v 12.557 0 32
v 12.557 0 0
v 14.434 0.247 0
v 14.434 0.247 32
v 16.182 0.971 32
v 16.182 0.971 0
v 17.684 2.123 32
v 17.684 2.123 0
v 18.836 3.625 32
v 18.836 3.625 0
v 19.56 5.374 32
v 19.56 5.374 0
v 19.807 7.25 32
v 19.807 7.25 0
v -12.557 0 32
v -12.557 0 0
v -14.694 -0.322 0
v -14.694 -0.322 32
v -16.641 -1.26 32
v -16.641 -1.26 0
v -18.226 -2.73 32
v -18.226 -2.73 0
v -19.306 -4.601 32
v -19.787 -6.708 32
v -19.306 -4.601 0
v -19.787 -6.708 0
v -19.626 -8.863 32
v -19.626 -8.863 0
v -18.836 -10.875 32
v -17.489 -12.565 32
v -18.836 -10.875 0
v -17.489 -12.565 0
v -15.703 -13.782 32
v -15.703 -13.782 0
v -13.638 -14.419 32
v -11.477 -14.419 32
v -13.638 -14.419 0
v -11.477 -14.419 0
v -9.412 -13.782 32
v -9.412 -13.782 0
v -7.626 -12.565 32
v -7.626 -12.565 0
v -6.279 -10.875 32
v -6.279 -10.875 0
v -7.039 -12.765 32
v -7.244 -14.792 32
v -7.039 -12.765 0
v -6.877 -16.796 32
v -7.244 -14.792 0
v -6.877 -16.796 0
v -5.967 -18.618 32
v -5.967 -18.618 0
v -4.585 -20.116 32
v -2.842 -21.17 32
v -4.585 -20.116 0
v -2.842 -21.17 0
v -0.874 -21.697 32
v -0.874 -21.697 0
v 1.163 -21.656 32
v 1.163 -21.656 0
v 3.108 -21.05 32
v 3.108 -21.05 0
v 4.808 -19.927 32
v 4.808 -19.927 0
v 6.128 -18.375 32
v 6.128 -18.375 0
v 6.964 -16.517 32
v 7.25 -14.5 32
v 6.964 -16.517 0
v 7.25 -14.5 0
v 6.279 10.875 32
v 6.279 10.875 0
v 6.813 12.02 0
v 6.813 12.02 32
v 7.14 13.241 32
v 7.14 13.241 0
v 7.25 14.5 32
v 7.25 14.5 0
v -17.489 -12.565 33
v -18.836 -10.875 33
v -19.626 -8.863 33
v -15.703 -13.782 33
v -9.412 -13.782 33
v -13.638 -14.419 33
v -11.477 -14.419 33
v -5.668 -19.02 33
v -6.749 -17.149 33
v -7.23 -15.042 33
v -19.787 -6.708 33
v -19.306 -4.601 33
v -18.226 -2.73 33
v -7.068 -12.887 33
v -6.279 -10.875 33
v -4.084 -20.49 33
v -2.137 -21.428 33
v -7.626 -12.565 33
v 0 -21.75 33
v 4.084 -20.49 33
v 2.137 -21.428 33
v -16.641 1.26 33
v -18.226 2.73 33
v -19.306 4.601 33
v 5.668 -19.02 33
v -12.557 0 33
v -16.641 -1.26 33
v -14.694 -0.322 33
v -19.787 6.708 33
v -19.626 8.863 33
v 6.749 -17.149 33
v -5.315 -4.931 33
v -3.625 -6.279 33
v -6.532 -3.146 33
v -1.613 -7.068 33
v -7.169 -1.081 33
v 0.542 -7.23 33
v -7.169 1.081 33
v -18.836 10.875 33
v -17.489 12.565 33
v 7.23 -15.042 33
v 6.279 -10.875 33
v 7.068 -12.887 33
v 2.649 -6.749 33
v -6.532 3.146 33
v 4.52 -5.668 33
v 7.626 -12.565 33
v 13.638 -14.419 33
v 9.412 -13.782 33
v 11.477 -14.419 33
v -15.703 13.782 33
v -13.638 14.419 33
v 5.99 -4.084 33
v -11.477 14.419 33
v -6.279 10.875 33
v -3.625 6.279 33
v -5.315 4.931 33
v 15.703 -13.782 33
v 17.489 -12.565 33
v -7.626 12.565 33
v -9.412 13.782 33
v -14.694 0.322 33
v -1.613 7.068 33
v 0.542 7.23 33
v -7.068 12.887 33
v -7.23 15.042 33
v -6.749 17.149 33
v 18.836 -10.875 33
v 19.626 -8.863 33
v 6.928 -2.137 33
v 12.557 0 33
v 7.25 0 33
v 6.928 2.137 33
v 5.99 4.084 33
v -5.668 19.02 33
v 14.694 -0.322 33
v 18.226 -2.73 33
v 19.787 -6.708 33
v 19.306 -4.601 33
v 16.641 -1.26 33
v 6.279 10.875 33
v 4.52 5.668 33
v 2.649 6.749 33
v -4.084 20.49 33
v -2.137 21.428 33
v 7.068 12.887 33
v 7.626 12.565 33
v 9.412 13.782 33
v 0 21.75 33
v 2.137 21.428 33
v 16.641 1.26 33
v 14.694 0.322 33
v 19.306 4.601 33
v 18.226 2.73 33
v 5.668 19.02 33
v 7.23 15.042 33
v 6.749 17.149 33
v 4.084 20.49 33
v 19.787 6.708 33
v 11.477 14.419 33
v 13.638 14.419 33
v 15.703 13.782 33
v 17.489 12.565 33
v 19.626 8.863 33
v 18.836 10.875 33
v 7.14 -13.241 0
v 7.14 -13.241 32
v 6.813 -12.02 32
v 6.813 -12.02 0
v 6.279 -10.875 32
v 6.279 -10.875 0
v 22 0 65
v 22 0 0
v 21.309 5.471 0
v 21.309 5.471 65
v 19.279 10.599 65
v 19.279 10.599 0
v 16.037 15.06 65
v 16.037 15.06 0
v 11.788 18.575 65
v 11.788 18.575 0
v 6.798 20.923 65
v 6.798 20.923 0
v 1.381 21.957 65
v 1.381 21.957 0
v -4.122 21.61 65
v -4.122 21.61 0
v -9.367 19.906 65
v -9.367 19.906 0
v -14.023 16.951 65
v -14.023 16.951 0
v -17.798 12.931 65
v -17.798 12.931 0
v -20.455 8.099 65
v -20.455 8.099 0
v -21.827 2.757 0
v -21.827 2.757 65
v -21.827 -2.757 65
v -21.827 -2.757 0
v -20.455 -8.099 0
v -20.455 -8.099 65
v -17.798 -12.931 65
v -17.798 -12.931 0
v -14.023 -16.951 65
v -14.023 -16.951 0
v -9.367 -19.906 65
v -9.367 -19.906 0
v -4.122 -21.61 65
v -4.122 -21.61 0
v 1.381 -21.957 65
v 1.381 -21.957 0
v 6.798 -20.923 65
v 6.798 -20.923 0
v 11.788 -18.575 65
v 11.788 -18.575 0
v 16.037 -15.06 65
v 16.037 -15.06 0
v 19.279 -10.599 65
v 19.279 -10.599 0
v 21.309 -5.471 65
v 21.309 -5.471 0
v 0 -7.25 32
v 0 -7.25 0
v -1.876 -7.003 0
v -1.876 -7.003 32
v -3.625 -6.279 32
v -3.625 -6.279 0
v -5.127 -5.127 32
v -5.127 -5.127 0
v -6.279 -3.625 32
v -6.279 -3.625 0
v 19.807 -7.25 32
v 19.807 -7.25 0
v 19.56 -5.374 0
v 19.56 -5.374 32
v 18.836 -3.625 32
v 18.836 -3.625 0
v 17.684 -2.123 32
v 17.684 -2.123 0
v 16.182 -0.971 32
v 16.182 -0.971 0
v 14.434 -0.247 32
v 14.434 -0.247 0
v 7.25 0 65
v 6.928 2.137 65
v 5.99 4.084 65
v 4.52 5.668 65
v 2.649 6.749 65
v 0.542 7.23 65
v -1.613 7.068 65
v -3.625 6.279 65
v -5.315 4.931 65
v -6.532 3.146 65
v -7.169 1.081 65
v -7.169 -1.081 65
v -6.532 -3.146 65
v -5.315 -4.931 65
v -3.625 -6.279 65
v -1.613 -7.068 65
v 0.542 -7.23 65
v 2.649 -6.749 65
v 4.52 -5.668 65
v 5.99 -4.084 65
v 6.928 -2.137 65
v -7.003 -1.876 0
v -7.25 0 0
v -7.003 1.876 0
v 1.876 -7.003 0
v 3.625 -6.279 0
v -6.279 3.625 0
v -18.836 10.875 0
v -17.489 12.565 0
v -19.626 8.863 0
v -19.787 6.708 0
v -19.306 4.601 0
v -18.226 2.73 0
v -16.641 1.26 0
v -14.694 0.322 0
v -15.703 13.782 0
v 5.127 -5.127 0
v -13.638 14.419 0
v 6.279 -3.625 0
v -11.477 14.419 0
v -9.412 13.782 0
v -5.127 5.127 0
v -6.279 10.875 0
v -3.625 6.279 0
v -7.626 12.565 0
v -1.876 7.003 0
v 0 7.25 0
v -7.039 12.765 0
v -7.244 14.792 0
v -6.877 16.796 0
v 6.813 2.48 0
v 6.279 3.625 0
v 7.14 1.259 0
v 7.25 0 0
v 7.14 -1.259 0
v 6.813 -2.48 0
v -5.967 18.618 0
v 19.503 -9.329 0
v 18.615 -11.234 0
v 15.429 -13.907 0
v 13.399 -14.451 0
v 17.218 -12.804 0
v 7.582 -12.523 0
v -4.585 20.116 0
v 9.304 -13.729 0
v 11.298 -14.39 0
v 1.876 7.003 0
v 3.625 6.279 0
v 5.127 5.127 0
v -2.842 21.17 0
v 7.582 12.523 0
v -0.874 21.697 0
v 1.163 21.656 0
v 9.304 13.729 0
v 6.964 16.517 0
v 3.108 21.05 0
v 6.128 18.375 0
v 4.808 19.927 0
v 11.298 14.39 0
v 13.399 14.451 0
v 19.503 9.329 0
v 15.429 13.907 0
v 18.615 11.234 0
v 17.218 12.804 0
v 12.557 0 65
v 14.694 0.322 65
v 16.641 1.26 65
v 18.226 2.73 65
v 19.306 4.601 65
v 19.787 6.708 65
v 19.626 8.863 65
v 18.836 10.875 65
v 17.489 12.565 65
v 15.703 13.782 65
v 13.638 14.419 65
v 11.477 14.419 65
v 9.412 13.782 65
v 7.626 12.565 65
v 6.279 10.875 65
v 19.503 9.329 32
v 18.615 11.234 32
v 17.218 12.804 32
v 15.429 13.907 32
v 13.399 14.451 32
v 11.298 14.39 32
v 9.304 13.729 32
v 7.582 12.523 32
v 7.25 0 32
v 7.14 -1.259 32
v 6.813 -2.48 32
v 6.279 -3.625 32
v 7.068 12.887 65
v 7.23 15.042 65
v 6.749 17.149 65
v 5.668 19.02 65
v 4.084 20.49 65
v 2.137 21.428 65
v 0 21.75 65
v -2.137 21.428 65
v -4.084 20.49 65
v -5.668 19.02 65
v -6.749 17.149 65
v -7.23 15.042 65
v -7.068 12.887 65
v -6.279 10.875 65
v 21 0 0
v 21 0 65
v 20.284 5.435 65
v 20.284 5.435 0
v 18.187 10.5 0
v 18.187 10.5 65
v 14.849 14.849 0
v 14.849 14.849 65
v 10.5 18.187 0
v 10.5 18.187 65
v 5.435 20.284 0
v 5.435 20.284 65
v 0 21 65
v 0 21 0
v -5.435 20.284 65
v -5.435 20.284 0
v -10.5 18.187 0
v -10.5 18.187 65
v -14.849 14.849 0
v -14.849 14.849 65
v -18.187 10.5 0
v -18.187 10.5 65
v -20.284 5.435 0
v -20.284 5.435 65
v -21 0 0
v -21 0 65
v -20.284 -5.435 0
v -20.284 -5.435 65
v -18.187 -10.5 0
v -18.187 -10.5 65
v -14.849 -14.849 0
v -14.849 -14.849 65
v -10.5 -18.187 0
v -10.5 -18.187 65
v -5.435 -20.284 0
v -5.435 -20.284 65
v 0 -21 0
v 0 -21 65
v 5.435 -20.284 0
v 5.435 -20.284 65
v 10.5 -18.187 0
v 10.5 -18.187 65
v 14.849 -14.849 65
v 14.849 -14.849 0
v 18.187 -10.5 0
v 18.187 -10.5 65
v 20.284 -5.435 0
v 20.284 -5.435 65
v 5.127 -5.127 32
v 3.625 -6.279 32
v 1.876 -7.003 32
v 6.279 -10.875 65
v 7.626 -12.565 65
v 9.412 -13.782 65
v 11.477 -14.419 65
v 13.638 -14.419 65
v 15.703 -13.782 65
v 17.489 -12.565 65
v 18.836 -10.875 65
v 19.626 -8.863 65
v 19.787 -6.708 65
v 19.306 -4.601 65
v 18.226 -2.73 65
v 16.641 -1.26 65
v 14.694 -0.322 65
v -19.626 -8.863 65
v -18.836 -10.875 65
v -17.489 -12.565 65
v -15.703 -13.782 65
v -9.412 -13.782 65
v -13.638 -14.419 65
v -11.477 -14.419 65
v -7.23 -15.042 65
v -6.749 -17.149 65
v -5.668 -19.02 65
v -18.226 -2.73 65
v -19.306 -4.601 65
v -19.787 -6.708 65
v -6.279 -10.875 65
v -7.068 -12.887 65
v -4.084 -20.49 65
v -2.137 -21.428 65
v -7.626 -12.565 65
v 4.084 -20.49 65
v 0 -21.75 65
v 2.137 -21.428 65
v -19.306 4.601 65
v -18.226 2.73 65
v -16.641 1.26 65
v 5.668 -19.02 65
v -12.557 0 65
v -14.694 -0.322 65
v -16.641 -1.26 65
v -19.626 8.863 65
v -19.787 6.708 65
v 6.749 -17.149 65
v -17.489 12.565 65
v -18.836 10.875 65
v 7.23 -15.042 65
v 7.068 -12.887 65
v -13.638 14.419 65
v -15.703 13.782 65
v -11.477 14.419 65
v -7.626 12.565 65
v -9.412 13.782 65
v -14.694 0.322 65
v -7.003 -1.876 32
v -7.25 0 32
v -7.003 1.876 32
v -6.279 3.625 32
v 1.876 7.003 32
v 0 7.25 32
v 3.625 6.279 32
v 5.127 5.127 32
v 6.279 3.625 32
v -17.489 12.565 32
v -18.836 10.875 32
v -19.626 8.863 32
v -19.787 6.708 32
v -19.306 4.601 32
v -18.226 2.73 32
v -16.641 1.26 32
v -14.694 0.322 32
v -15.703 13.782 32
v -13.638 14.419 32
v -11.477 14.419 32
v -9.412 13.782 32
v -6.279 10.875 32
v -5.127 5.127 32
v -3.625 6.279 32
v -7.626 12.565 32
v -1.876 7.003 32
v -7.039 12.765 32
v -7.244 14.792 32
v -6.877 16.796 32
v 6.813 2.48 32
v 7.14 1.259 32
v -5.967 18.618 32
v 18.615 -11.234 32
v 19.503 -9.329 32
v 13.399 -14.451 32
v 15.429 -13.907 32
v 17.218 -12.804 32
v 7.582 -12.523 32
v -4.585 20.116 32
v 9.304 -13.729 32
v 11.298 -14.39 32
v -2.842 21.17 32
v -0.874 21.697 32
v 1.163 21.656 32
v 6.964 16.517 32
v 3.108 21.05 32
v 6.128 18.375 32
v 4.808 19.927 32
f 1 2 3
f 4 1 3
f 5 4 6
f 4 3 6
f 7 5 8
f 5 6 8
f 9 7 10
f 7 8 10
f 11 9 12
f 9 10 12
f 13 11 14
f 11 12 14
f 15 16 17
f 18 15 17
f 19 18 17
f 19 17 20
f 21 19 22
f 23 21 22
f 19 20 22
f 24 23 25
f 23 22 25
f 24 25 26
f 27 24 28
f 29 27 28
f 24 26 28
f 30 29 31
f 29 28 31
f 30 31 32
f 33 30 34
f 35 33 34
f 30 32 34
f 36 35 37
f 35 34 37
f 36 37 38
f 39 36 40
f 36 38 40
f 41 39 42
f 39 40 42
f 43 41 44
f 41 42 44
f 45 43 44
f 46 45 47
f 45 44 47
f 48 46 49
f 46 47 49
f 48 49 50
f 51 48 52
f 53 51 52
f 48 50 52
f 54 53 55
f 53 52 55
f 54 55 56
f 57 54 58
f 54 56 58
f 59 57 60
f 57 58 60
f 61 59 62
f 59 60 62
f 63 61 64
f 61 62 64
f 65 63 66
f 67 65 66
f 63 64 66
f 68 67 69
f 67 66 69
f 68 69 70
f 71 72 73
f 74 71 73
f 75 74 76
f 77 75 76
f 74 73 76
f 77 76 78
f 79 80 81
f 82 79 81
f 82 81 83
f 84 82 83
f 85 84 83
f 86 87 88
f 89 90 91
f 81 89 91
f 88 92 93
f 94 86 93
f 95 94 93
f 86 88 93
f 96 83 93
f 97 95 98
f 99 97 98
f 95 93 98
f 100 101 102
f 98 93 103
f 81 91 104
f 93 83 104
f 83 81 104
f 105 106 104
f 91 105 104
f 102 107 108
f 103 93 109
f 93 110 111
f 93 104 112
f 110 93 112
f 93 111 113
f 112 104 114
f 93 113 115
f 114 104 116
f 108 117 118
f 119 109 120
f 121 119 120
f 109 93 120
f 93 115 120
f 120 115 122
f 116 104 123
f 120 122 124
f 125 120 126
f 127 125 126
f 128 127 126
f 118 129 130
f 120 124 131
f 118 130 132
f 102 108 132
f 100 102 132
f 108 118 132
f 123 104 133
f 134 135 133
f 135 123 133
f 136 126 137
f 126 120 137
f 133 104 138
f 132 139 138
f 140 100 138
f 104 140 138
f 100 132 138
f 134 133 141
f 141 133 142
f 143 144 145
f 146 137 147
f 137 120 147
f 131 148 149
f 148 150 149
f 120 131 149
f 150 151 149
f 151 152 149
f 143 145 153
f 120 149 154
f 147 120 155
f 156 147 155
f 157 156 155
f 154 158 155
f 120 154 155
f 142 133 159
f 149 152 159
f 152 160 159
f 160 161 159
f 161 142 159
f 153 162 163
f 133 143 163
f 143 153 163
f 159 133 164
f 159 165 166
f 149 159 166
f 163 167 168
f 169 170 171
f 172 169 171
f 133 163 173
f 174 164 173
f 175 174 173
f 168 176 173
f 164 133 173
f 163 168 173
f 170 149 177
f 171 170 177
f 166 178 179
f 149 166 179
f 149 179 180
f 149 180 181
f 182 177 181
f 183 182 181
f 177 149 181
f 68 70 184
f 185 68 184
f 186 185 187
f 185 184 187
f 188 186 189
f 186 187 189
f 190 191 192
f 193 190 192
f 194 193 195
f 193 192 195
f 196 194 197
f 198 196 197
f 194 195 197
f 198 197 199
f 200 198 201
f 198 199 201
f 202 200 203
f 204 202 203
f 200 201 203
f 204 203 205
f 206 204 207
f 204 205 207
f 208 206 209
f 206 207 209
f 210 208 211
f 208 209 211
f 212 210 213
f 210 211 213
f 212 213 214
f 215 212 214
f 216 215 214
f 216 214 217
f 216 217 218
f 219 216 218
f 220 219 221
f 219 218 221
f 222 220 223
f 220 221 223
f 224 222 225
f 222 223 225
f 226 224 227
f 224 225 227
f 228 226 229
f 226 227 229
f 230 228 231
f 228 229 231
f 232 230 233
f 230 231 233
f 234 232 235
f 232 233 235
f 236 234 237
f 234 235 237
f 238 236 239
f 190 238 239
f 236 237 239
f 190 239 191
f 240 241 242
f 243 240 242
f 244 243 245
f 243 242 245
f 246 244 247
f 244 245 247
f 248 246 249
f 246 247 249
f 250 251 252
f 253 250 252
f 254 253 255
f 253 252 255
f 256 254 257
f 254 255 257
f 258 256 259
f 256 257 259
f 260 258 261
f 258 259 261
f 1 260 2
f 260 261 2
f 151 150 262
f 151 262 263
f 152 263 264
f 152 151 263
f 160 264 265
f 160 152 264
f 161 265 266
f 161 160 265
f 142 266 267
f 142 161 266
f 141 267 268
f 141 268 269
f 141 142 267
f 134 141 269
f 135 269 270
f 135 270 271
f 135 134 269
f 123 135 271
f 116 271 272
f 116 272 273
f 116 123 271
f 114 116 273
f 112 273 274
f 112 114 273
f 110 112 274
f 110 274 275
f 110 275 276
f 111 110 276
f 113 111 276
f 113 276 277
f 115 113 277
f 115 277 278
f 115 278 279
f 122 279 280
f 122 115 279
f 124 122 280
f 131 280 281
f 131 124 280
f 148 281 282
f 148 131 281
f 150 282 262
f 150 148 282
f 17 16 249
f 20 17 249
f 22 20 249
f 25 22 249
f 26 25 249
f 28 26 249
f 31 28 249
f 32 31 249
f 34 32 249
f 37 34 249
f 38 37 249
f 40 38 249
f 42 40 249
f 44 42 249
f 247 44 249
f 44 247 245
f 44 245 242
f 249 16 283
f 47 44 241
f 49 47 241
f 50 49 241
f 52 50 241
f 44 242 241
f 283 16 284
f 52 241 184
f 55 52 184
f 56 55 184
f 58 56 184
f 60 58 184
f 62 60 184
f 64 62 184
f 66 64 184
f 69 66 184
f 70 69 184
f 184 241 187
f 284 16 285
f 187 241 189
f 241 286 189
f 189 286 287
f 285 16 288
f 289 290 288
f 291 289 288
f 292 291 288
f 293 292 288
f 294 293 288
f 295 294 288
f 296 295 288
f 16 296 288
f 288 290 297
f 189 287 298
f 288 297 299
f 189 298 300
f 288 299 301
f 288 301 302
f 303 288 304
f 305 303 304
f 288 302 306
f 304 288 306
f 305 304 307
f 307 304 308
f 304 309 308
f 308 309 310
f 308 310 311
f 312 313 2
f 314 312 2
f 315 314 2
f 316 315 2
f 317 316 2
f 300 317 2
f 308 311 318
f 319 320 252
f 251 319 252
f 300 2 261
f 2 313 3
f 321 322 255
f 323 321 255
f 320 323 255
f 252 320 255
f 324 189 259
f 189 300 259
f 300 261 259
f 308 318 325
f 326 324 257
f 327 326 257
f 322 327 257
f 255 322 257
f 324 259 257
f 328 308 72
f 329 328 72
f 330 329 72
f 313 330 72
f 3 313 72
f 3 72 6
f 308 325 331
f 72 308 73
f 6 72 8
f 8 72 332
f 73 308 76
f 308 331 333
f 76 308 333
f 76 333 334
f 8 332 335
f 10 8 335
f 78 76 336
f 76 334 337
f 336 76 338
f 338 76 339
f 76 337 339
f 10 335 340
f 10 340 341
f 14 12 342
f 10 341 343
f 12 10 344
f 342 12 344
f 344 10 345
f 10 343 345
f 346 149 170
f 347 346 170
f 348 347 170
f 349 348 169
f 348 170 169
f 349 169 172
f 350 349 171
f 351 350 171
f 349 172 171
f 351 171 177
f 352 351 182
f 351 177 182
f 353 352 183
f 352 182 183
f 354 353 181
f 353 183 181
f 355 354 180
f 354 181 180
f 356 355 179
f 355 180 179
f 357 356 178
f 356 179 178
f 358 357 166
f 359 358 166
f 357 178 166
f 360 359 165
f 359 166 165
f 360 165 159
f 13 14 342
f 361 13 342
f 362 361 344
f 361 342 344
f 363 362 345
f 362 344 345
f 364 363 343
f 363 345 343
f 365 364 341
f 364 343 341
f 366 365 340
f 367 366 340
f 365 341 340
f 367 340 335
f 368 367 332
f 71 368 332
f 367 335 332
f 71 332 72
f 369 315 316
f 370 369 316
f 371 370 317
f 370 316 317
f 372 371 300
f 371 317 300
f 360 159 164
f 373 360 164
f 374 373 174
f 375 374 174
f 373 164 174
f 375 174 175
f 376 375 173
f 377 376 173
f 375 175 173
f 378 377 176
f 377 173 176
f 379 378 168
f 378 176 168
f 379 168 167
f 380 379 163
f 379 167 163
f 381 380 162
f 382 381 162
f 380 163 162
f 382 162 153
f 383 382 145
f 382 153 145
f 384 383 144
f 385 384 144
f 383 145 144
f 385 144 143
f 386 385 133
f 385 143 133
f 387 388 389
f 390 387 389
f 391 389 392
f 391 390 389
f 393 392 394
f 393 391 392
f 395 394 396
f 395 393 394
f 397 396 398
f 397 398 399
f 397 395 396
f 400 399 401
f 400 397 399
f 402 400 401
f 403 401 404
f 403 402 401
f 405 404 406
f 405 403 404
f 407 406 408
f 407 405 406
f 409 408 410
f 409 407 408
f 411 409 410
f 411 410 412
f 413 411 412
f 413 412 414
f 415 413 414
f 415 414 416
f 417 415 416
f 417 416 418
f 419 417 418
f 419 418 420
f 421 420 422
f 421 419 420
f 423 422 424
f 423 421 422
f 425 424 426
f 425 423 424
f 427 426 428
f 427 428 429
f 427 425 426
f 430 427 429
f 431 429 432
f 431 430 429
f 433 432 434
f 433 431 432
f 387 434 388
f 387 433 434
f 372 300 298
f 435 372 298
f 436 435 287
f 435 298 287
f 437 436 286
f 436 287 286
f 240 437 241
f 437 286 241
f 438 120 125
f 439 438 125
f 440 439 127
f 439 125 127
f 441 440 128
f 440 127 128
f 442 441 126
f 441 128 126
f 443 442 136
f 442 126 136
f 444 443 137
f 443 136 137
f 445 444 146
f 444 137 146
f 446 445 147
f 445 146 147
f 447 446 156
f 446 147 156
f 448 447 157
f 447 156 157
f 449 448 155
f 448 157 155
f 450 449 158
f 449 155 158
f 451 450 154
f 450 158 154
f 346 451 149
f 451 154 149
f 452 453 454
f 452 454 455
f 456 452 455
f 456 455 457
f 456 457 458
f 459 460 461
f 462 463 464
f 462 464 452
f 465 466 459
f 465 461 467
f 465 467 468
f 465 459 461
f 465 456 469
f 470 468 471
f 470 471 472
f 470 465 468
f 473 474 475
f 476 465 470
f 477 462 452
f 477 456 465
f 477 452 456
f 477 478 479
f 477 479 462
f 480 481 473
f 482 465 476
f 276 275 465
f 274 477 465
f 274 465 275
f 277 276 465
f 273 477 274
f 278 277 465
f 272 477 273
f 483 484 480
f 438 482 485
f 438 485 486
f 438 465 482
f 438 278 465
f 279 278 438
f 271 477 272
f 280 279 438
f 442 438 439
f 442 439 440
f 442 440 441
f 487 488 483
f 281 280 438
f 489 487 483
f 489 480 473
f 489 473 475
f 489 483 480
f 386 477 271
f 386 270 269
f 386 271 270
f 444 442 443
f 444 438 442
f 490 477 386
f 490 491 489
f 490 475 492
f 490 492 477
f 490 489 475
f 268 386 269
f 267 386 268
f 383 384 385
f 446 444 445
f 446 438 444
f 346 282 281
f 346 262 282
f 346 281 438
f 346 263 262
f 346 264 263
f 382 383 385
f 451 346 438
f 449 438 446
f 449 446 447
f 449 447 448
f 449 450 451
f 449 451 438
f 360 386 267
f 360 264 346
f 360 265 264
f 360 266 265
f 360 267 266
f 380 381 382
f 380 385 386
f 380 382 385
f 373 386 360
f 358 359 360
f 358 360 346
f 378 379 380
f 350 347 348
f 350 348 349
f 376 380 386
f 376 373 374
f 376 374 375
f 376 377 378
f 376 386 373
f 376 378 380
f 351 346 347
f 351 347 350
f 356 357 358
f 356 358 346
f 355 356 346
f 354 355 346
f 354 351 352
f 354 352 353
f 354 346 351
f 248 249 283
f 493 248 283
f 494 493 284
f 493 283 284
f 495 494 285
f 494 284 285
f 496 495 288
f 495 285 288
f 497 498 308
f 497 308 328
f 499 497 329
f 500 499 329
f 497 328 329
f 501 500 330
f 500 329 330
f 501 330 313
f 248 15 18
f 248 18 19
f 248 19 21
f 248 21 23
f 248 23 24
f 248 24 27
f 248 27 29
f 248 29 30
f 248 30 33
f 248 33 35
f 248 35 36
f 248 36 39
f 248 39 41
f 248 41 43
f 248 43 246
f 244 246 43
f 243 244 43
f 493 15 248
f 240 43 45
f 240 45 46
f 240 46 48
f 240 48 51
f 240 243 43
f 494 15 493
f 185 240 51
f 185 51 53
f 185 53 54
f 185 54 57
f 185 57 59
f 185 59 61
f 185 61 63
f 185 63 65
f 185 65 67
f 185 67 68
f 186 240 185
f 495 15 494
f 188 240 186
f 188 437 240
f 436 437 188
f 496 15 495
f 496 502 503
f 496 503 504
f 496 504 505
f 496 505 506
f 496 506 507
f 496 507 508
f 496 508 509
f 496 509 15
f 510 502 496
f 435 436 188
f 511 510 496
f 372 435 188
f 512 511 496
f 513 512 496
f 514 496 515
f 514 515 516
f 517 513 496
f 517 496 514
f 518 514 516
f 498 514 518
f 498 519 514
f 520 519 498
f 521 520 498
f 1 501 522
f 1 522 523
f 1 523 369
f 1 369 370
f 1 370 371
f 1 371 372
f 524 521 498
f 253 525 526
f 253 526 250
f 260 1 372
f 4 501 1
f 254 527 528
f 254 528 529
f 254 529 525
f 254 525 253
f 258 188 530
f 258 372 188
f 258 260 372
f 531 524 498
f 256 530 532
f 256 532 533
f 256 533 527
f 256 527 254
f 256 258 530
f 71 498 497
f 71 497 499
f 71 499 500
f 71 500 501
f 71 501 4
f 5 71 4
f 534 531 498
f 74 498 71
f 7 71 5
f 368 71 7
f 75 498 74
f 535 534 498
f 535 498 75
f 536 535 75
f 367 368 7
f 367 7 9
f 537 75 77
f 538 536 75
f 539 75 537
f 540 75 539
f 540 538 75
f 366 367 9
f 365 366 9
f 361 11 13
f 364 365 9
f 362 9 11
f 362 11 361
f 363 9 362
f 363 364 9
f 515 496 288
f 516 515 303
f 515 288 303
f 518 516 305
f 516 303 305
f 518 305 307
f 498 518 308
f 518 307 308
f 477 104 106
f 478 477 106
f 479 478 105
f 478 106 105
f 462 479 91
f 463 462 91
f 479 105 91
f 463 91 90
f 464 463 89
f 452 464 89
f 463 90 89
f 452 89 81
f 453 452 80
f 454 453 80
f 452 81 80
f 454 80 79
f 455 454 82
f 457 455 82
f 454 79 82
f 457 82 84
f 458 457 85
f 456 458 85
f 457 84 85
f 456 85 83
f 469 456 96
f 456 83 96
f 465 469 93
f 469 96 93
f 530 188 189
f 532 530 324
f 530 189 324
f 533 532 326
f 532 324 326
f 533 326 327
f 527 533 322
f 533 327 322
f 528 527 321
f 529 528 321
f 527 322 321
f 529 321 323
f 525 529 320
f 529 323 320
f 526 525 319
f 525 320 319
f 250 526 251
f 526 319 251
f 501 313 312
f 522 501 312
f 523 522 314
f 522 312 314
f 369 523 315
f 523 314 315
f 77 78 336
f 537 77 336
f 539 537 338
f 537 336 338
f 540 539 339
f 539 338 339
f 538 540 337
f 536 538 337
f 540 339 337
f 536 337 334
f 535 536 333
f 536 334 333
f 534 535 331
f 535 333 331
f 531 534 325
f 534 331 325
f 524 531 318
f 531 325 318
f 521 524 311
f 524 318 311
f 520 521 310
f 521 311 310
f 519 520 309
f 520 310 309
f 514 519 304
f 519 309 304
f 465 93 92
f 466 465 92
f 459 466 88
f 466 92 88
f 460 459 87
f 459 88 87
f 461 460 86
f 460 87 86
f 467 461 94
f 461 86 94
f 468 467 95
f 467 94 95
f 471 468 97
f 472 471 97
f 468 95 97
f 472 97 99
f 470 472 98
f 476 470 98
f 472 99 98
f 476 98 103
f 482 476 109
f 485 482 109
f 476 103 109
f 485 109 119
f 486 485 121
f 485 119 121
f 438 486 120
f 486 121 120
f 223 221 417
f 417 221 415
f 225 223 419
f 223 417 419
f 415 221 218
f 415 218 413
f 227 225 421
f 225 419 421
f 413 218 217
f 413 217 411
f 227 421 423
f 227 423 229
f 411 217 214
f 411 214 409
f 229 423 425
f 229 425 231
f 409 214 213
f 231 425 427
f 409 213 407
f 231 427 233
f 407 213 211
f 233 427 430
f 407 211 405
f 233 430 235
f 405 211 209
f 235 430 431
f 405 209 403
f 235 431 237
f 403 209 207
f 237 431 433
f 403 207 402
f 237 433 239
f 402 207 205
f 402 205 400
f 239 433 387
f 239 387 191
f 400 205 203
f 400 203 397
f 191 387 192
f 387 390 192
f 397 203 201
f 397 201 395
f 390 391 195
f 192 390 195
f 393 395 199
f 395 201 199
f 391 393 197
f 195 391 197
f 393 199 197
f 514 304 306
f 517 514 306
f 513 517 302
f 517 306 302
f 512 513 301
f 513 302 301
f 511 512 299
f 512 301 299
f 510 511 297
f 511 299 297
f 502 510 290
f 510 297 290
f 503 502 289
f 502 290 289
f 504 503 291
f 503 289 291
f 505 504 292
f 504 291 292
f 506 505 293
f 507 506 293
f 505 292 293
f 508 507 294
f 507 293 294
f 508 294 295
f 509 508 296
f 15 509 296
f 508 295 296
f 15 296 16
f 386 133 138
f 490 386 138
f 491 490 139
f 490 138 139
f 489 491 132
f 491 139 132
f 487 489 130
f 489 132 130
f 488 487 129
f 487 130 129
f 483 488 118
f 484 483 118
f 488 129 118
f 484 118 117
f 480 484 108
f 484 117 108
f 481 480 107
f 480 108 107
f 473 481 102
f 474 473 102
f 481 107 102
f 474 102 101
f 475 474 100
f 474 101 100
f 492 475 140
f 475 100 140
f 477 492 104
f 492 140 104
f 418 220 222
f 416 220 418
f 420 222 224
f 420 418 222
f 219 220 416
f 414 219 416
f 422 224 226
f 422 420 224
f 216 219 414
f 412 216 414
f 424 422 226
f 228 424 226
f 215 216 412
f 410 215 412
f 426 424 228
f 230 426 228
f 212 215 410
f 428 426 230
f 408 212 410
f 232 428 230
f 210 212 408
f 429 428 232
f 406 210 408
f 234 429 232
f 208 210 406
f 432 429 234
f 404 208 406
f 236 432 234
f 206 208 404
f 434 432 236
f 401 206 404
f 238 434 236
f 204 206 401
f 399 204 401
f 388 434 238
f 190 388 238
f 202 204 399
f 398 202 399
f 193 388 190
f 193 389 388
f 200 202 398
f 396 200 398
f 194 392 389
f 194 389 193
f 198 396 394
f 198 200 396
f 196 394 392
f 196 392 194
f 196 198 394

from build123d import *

# Parameters (mm, degrees)
F1_DEPTH  = 32
F2_START  = 1
F1_FACE_R = 7.25
F2_DEPTH  = 32
F3_R      = 22
F3_R_2    = 21
F4_DEPTH  = 65


with BuildPart() as f1:
    # F0 (on Top) → F1 (new body)
    with BuildSketch(Plane.XY):
        with BuildLine():
            ThreePointArc((6.278684147, 10.8749999472), (7.0029622327, 12.6235618936), (7.25, 14.5))
            ThreePointArc((7.25, 14.5), (-1.8764380406, 21.5029622503), (-6.2786842151, 10.8750000652))
            ThreePointArc((-6.2786842151, 10.8750000652), (-3.6250000326, 8.2213158414), (0, 7.25))
            ThreePointArc((0, 7.25), (3.6249999736, 8.2213158073), (6.278684147, 10.8749999472))
        make_face()
        with BuildLine():
            ThreePointArc((0, 7.25), (-3.6250000326, 8.2213158414), (-6.2786842151, 10.8750000652))
            ThreePointArc((-6.2786842151, 10.8750000652), (-5.554406124, 9.1264381133), (-5.3073683549, 7.25))
            ThreePointArc((-5.3073683549, 7.25), (-5.5544061045, 5.3735619594), (-6.2786841398, 3.6250000652))
            ThreePointArc((-6.2786841398, 3.6250000652), (-3.6249999674, 6.2786841963), (0, 7.25))
        make_face()
        with BuildLine():
            ThreePointArc((-5.3073683549, 7.25), (-5.554406124, 9.1264381133), (-6.2786842151, 10.8750000652))
            ThreePointArc((-6.2786842151, 10.8750000652), (-18.8360525511, 10.8749999674), (-12.5573683549, 0))
            ThreePointArc((-12.5573683549, 0), (-8.9323683223, 0.9713158414), (-6.2786841398, 3.6250000652))
            ThreePointArc((-6.2786841398, 3.6250000652), (-5.5544061045, 5.3735619594), (-5.3073683549, 7.25))
        make_face()
        with BuildLine():
            ThreePointArc((6.278684216, 3.6249999331), (5.3073683549, 7.2499999309), (6.278684147, 10.8749999472))
            ThreePointArc((6.278684147, 10.8749999472), (3.6249999736, 8.2213158073), (0, 7.25))
            ThreePointArc((0, 7.25), (3.6250000334, 6.2786841581), (6.278684216, 3.6249999331))
        make_face()
        with BuildLine():
            ThreePointArc((19.8073683549, 7.25), (14.4338064024, 14.2529622485), (6.278684147, 10.8749999472))
            ThreePointArc((6.278684147, 10.8749999472), (5.3073683549, 7.2499999309), (6.278684216, 3.6249999331))
            ThreePointArc((6.278684216, 3.6249999331), (8.932368391, 0.9713158017), (12.557368361, 0))
            ThreePointArc((12.557368361, 0), (17.6838925206, 2.1234758386), (19.8073683549, 7.25))
        make_face()
        with BuildLine():
            ThreePointArc((-6.2786841398, 3.6250000652), (-8.9323683223, 0.9713158414), (-12.5573683549, 0))
            ThreePointArc((-12.5573683549, 0), (-8.9323683494, -0.9713158258), (-6.2786841711, -3.625000011))
            ThreePointArc((-6.2786841711, -3.625000011), (-7.25, 3.13e-08), (-6.2786841398, 3.6250000652))
        make_face()
        with BuildLine():
            ThreePointArc((-6.2786841711, -3.625000011), (-8.9323683494, -0.9713158258), (-12.5573683549, 0))
            ThreePointArc((-12.5573683549, 0), (-18.8360525345, -10.8749999961), (-6.2786841819, -10.8750000077))
            ThreePointArc((-6.2786841819, -10.8750000077), (-5.5544061154, -9.1264380813), (-5.3073683549, -7.25))
            ThreePointArc((-5.3073683549, -7.25), (-5.5544061126, -5.3735619292), (-6.2786841711, -3.625000011))
        make_face()
        with BuildLine():
            ThreePointArc((12.557368361, 0), (8.932368391, 0.9713158017), (6.278684216, 3.6249999331))
            ThreePointArc((6.278684216, 3.6249999331), (7.0029622506, 1.8764380397), (7.25, 0))
            ThreePointArc((7.25, 0), (7.0029622201, -1.8764381537), (6.2786840981, -3.6250001375))
            ThreePointArc((6.2786840981, -3.6250001375), (8.9323682888, -0.9713158607), (12.557368361, 0))
        make_face()
        with BuildLine():
            ThreePointArc((-9.9e-09, -7.25), (-3.6249999988, -6.2786841781), (-6.2786841711, -3.625000011))
            ThreePointArc((-6.2786841711, -3.625000011), (-5.5544061126, -5.3735619292), (-5.3073683549, -7.25))
            ThreePointArc((-5.3073683549, -7.25), (-5.5544061154, -9.1264380813), (-6.2786841819, -10.8750000077))
            ThreePointArc((-6.2786841819, -10.8750000077), (-3.6250000082, -8.2213158273), (-9.9e-09, -7.25))
        make_face()
        with BuildLine():
            ThreePointArc((-9.9e-09, -7.25), (-3.6250000082, -8.2213158273), (-6.2786841819, -10.8750000077))
            ThreePointArc((-6.2786841819, -10.8750000077), (-1.8764380727, -21.5029622417), (7.25, -14.5))
            ThreePointArc((7.25, -14.5), (7.0029622192, -12.6235618433), (6.278684095, -10.8749998571))
            ThreePointArc((6.278684095, -10.8749998571), (3.6249999243, -8.2213157788), (-9.9e-09, -7.25))
        make_face()
        with BuildLine():
            ThreePointArc((19.8073683549, -7.25), (17.6838925206, -2.1234758386), (12.557368361, 0))
            ThreePointArc((12.557368361, 0), (8.9323682888, -0.9713158607), (6.2786840981, -3.6250001375))
            ThreePointArc((6.2786840981, -3.6250001375), (5.3073683549, -7.2499999969), (6.278684095, -10.8749998571))
            ThreePointArc((6.278684095, -10.8749998571), (14.4338063522, -14.2529622619), (19.8073683549, -7.25))
        make_face()
        with BuildLine():
            ThreePointArc((6.2786840981, -3.6250001375), (3.624999927, -6.2786842196), (-9.9e-09, -7.25))
            ThreePointArc((-9.9e-09, -7.25), (3.6249999243, -8.2213157788), (6.278684095, -10.8749998571))
            ThreePointArc((6.278684095, -10.8749998571), (5.3073683549, -7.2499999969), (6.2786840981, -3.6250001375))
        make_face()
    extrude(amount=F1_DEPTH)


with BuildPart() as f2:
    # F1_face (on face) → F2 (new body)
    with BuildSketch(Plane.XY.offset(32).offset(F2_START)):
        with BuildLine():
            ThreePointArc((-6.2786841819, -10.8750000077), (8.69e-08, -21.75), (6.278684095, -10.8749998571))
            ThreePointArc((6.278684095, -10.8749998571), (18.8360524895, -10.8750000741), (12.557368361, 0))
            ThreePointArc((12.557368361, 0), (18.8360525155, 10.875000029), (6.278684147, 10.8749999472))
            ThreePointArc((6.278684147, 10.8749999472), (6.81e-08, 21.75), (-6.2786842151, 10.8750000652))
            ThreePointArc((-6.2786842151, 10.8750000652), (-18.8360525511, 10.8749999674), (-12.5573683549, 0))
            ThreePointArc((-12.5573683549, 0), (-18.8360525345, -10.8749999961), (-6.2786841819, -10.8750000077))
        make_face()
        Circle(F1_FACE_R, mode=Mode.SUBTRACT)
    extrude(amount=F2_DEPTH)


with BuildPart() as f4:
    # F3 (on Top) → F4 (new body)
    with BuildSketch(Plane.XY):
        Circle(F3_R)
        Circle(F3_R_2, mode=Mode.SUBTRACT)
    extrude(amount=F4_DEPTH)


solid = Compound([f1.part, f2.part, f4.part])
